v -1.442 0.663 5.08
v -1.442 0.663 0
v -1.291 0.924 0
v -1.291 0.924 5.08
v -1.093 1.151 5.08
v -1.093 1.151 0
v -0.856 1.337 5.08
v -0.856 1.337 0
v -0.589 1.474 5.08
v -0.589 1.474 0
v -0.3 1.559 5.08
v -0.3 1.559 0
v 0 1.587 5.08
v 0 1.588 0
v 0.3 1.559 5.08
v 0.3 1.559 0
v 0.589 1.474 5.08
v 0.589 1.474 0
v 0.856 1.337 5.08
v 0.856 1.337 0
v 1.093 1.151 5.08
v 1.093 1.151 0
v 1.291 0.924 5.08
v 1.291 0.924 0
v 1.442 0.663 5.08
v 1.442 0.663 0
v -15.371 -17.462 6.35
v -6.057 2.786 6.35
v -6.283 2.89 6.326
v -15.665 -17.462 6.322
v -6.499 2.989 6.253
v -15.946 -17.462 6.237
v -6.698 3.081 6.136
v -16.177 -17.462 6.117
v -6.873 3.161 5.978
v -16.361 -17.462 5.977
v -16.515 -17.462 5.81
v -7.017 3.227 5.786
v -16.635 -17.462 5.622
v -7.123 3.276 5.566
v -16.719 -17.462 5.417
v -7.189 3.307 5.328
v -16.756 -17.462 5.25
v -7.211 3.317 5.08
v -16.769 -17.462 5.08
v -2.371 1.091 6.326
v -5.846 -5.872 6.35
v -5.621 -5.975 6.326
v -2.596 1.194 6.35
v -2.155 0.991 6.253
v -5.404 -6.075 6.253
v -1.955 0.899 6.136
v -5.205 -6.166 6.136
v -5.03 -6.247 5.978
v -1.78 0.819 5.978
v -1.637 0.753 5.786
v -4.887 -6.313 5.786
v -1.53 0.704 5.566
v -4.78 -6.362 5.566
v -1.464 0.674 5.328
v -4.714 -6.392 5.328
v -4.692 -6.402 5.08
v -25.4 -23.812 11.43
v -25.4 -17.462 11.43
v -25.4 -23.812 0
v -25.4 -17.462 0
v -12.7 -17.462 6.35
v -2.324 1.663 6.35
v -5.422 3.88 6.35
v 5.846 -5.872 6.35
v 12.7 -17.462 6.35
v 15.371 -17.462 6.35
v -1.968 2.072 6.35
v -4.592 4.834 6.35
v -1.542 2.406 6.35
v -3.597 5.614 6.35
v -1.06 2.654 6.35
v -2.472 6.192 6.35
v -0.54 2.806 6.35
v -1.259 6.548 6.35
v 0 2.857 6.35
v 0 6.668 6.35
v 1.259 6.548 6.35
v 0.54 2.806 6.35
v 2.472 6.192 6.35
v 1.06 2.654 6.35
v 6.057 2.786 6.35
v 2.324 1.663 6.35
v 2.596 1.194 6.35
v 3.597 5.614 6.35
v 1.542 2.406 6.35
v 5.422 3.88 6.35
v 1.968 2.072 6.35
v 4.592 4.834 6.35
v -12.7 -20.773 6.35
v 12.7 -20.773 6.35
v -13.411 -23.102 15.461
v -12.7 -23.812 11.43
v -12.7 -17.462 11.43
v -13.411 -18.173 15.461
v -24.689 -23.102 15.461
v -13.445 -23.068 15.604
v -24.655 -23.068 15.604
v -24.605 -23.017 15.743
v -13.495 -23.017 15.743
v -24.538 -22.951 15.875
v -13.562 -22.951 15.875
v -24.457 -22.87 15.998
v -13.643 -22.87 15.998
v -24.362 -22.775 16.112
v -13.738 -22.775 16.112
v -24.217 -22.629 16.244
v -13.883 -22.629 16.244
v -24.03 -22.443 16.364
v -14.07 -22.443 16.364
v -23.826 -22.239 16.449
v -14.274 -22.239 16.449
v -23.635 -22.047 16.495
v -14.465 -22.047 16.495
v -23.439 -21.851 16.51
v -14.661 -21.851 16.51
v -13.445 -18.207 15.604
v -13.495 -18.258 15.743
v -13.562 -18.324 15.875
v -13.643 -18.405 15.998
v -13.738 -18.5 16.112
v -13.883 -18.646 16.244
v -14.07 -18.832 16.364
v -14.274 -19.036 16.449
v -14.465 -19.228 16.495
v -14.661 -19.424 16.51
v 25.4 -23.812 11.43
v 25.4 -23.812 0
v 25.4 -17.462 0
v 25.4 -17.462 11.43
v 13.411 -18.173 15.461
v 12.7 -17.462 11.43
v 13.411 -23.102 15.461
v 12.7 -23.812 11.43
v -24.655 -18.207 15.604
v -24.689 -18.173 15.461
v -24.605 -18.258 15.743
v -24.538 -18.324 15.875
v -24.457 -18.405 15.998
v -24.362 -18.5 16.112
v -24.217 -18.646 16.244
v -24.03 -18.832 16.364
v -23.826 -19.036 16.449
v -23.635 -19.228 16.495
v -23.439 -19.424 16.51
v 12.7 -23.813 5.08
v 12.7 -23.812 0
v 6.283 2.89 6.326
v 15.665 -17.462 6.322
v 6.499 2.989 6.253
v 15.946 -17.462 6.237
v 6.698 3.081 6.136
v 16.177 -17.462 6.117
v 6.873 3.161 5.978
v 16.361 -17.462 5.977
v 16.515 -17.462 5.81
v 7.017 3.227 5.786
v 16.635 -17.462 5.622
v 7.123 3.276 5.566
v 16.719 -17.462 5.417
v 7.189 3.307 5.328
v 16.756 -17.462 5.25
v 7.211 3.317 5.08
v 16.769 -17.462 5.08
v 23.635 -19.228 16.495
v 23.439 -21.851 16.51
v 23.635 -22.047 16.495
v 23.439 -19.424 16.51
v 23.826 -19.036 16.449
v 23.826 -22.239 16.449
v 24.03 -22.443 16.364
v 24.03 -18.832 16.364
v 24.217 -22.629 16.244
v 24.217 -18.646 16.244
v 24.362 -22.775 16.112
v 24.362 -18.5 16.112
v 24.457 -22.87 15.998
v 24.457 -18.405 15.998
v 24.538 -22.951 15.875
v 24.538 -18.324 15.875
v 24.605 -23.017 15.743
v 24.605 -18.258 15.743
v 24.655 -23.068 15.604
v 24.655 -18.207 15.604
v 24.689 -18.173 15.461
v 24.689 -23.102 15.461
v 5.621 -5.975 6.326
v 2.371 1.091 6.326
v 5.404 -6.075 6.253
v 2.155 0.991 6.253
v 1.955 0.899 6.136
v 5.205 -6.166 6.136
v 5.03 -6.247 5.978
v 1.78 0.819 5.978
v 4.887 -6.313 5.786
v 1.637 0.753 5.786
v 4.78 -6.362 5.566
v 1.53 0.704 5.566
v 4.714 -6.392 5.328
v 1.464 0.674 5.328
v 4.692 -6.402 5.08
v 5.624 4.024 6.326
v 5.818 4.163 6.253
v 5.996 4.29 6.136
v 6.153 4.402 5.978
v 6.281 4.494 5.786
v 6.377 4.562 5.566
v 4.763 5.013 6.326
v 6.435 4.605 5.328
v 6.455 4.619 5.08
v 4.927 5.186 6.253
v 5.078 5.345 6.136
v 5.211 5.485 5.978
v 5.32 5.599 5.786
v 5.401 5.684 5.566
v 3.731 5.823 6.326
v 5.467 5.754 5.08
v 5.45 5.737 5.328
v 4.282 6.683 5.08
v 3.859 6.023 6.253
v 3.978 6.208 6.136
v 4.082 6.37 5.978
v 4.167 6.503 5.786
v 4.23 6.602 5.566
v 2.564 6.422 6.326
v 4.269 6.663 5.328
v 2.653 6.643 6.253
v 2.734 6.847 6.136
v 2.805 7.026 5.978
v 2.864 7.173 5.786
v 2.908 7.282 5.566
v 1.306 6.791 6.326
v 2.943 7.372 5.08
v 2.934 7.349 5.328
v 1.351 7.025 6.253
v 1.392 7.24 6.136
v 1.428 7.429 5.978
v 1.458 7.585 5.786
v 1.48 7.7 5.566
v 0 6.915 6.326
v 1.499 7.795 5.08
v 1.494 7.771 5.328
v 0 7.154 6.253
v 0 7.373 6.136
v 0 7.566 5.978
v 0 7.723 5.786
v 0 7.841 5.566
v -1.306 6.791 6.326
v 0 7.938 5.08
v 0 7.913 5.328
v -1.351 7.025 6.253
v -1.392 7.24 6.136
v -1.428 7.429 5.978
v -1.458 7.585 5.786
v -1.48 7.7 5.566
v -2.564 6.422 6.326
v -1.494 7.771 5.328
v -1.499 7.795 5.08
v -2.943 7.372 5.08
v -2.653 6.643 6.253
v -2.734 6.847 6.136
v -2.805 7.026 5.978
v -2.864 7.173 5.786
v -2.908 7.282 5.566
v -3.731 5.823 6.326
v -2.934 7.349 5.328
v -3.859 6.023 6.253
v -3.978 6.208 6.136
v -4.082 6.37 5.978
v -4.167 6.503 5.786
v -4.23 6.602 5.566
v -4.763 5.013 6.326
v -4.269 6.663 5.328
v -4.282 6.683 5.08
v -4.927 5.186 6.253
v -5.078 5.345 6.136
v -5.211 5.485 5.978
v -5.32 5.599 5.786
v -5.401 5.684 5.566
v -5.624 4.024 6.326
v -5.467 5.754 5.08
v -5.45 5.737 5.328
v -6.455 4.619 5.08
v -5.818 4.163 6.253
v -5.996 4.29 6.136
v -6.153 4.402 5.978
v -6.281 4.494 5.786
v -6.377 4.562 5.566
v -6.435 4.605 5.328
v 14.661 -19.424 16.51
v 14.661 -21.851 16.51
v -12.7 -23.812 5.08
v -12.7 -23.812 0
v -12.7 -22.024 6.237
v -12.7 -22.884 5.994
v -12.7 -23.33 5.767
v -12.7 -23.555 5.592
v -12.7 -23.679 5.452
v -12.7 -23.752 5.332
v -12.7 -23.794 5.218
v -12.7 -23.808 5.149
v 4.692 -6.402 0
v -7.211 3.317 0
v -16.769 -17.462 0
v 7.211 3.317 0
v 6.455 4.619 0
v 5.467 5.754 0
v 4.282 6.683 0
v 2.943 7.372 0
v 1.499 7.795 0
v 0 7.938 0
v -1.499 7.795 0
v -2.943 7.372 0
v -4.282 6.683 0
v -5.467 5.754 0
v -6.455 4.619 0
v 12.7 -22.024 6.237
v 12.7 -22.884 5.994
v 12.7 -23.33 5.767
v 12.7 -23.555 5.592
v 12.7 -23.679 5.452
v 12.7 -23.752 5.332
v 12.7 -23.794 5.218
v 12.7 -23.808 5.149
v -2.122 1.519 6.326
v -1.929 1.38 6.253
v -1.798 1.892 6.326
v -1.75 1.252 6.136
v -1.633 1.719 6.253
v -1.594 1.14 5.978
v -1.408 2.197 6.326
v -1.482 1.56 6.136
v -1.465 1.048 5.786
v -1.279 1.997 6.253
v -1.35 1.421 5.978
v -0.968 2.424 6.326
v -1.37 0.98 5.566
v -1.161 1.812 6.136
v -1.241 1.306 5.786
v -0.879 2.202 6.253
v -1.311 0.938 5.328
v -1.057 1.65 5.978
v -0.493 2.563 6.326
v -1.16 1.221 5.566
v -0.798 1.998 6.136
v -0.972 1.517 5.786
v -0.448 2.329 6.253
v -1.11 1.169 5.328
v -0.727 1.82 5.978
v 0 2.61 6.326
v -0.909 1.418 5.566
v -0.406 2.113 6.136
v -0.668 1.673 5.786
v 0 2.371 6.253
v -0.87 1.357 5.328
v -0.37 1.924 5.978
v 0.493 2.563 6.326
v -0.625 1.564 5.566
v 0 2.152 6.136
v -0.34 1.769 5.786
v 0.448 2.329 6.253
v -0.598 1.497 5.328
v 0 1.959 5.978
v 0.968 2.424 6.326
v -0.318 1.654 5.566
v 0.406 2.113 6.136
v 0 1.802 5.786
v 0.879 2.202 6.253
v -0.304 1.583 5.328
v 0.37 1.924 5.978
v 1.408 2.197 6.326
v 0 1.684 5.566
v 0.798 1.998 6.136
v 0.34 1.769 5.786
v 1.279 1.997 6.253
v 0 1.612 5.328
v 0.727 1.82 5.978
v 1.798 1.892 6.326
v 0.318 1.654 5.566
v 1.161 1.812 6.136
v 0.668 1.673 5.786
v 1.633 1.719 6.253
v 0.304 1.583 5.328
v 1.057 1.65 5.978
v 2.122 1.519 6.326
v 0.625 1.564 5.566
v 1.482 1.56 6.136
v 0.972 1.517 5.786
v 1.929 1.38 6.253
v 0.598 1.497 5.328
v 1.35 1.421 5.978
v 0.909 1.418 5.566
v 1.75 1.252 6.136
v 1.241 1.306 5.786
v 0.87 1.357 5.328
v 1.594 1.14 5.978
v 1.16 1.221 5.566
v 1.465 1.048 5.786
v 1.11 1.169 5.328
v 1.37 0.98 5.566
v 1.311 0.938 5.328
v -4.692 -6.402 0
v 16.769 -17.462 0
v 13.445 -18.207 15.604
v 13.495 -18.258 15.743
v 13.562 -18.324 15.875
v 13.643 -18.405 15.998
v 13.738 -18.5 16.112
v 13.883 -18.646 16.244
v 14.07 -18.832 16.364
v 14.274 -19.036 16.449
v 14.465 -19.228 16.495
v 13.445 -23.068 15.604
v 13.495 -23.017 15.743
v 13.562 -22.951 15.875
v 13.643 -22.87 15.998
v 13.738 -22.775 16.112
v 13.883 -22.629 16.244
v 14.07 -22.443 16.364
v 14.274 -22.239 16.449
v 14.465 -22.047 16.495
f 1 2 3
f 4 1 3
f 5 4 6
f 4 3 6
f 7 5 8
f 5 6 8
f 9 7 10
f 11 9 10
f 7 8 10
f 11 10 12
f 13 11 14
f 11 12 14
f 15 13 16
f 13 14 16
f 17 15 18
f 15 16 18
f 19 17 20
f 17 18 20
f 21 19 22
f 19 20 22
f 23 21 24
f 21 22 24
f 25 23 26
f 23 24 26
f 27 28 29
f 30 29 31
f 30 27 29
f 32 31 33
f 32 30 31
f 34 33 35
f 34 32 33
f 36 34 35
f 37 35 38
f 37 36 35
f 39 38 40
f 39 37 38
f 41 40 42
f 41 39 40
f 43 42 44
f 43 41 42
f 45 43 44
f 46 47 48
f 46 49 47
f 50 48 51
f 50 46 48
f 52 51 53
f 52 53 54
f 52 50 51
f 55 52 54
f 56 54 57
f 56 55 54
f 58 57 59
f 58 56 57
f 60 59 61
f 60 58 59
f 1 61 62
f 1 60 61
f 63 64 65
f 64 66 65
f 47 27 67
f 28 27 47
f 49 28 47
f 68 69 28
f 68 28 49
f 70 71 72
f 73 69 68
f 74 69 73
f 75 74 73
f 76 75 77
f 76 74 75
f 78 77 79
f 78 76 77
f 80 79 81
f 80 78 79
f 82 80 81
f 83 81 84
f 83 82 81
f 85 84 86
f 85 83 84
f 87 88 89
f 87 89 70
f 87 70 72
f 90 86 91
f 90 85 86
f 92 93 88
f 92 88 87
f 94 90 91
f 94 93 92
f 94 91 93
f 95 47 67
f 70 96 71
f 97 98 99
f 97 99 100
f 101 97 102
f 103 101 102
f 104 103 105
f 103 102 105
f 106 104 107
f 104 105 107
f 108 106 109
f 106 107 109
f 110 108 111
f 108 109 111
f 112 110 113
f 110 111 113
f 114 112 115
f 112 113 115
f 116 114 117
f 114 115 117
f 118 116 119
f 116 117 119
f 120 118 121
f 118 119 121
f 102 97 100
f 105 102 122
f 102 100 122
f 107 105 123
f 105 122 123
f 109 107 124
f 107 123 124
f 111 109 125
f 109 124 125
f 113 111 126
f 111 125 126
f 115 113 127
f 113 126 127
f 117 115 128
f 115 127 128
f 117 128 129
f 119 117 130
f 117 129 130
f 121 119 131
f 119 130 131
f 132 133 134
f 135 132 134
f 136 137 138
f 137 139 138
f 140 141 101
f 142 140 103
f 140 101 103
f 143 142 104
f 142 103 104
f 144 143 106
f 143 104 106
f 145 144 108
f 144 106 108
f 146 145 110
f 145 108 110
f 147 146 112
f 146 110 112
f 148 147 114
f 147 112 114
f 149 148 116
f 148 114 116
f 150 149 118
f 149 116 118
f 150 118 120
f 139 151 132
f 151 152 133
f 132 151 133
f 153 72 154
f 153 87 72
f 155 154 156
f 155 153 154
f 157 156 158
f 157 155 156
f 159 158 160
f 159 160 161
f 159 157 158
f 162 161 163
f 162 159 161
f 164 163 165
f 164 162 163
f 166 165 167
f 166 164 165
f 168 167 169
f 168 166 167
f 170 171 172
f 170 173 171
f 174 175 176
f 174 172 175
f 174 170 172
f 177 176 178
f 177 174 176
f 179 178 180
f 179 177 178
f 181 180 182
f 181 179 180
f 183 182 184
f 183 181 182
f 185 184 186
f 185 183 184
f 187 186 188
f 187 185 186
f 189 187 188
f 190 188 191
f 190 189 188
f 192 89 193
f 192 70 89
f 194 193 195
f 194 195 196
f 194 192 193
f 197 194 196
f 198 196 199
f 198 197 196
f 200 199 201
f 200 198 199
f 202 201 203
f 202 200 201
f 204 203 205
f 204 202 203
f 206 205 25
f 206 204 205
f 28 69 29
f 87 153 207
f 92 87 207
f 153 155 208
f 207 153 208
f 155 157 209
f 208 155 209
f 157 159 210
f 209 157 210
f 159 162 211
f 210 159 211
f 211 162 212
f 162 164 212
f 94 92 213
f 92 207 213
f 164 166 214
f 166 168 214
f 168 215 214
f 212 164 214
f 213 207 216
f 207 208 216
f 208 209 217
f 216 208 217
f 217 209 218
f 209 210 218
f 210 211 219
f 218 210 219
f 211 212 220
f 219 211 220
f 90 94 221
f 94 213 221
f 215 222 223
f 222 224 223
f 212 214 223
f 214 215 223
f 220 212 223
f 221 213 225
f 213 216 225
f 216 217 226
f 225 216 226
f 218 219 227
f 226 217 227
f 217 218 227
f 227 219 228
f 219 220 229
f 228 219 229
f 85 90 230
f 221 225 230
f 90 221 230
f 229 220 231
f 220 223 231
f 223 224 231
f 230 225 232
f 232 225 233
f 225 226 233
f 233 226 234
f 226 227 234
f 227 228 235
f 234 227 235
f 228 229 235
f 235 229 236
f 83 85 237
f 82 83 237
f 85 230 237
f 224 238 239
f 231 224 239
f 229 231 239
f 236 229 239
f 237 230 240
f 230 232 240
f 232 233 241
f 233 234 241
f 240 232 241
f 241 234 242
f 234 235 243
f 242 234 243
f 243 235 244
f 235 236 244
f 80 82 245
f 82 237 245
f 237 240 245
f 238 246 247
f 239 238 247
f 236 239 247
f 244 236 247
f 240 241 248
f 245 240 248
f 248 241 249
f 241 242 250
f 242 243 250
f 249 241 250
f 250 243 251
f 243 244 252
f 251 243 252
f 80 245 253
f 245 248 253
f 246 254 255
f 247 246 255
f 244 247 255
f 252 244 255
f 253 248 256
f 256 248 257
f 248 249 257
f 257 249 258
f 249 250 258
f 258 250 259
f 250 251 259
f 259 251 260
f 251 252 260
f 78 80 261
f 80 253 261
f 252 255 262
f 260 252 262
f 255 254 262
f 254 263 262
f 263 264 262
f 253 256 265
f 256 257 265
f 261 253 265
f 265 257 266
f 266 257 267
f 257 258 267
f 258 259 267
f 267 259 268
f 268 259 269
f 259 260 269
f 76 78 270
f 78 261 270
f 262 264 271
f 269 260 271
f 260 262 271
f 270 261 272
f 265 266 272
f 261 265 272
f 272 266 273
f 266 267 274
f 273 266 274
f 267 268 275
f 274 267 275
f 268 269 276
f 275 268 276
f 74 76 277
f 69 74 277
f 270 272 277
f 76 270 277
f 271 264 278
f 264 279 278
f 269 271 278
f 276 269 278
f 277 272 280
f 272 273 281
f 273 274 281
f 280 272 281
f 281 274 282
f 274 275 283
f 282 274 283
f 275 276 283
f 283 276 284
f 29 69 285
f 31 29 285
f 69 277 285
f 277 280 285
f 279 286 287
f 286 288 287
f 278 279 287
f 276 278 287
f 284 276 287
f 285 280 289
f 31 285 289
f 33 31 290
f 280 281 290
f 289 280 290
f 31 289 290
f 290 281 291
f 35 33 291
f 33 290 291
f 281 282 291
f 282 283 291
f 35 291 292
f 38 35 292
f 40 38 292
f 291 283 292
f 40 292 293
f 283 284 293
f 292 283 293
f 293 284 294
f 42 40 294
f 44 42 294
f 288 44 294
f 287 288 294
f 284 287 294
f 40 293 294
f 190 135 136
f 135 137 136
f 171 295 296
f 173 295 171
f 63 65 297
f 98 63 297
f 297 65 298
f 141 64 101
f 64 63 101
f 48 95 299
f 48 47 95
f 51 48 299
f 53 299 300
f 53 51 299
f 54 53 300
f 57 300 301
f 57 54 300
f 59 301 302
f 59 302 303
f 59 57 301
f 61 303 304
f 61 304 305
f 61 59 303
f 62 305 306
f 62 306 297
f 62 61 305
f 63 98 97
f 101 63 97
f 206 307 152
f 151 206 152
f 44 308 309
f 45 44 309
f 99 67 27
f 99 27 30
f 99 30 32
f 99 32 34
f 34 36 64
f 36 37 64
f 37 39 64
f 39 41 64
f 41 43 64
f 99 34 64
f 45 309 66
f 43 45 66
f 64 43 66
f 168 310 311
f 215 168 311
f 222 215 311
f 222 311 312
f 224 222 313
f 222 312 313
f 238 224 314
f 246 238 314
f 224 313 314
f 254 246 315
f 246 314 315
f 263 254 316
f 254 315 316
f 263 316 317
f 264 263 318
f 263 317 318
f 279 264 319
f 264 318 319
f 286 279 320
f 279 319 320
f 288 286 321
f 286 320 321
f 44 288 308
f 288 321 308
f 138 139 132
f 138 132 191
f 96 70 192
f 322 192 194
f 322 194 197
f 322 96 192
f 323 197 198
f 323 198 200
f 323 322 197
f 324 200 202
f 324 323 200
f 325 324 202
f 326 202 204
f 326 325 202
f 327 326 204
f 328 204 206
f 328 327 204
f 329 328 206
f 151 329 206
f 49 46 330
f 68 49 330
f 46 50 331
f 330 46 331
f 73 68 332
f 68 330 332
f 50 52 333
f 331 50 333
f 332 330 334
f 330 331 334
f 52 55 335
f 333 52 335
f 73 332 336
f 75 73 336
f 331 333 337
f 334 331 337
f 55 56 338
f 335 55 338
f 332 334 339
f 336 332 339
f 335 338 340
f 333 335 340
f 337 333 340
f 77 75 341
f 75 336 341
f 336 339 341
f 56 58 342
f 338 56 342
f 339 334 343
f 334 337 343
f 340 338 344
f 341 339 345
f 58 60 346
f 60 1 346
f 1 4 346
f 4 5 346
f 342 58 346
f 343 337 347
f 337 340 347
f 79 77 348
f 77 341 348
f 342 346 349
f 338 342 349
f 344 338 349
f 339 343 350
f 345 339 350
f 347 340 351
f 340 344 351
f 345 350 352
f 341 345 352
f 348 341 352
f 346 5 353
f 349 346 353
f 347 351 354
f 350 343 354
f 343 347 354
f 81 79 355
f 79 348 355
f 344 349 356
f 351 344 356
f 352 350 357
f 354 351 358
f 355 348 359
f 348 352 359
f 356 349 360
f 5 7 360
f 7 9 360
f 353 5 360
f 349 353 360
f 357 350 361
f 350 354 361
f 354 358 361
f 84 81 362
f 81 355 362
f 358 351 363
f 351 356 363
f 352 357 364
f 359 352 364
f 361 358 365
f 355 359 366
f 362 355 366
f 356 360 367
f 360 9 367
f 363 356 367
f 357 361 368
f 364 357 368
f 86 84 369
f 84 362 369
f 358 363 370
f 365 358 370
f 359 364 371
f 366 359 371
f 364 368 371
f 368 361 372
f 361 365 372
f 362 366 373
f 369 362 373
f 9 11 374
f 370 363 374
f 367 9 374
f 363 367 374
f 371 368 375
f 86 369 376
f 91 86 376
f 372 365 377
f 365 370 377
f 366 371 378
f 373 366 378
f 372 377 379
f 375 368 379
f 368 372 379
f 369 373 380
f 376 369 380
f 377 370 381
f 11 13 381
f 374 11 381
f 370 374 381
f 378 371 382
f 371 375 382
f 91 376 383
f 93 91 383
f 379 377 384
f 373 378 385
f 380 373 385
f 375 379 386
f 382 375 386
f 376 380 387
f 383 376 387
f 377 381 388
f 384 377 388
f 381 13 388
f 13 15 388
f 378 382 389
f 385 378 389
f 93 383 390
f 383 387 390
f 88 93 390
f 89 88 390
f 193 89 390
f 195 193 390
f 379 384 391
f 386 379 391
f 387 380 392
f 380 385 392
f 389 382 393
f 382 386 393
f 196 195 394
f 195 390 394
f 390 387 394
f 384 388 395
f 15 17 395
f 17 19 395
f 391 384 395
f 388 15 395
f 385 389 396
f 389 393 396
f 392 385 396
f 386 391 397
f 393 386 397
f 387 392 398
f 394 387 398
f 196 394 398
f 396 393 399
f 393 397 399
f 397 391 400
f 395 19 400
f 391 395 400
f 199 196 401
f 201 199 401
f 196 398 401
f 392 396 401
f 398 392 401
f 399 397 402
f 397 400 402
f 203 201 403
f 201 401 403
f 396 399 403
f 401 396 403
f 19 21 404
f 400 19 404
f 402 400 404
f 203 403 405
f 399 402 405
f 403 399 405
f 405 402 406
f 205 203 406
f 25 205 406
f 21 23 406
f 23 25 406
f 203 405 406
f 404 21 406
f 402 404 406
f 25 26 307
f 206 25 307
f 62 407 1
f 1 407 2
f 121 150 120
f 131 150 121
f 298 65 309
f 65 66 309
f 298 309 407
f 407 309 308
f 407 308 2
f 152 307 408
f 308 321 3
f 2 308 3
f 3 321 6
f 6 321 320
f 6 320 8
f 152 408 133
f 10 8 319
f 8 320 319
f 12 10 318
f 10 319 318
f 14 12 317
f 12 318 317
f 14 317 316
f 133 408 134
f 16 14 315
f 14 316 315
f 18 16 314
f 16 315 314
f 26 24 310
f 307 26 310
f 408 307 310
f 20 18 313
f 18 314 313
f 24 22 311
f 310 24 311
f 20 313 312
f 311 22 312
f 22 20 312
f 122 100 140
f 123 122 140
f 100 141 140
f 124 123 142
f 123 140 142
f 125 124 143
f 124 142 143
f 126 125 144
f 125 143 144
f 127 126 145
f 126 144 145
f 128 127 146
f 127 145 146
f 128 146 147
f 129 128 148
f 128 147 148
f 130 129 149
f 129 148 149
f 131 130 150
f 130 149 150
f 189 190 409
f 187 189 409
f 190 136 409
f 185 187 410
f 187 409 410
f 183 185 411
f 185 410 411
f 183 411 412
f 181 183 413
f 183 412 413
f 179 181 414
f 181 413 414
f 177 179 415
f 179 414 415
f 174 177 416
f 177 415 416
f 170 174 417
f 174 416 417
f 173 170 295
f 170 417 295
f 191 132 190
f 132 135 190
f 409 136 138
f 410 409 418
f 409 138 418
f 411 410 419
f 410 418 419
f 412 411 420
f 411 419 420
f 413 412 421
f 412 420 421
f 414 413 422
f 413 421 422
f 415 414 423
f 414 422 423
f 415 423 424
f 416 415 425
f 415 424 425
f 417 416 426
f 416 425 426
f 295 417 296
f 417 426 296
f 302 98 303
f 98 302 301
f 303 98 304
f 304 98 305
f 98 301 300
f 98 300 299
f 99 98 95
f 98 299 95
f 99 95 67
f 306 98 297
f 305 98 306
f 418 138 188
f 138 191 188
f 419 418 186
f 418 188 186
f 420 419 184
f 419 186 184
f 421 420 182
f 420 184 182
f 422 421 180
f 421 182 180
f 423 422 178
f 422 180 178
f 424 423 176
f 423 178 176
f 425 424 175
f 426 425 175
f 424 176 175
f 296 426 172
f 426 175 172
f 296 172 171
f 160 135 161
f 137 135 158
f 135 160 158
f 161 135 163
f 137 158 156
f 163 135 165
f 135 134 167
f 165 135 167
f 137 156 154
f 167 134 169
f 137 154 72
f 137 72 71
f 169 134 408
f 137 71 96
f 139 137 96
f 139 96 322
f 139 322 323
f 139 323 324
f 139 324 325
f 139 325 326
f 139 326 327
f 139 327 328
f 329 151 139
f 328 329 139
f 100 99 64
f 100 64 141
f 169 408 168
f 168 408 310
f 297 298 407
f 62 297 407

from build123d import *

# Parameters (mm, degrees)
F2_DEPTH  = 6.35
F5_DEPTH  = 5.08
F5_FACE_W = 12.7
F5_FACE_H = 6.35
F6_DEPTH  = 5.08
F6_TAPER  = 10
F7_R      = 1.27


# Not quite as in the source:
# - a variable given as a bare number and used for a length is read in inches; the dataset says mm whatever the document's units were


with BuildPart() as f2:
    # F1 (on Top) → F2 (new body)
    with BuildSketch(Plane.XY):
        Polygon((-25.4, -23.8125), (-12.7, -23.8125), (-12.7, -17.4625), (-16.7687909609, -17.4625), (-25.4, -17.4625), align=None)
        with BuildLine():
            Line((-12.7, -23.8125), (-4.6920856358, -6.4022057634))
            ThreePointArc((-4.6920856358, -6.4022057634), (-7.6835843575, -1.991591743), (-7.2112720666, 3.3168451022))
            Line((-7.2112720666, 3.3168451022), (-16.7687909609, -17.4625))
            Line((-16.7687909609, -17.4625), (-12.7, -17.4625))
            Line((-12.7, -17.4625), (-12.7, -23.8125))
        make_face()
        with BuildLine():
            ThreePointArc((-1.4422544133, 0.6633690204), (0, 1.5875), (1.4422544133, 0.6633690204))
            Line((1.4422544133, 0.6633690204), (4.6920856358, -6.4022057634))
            ThreePointArc((4.6920856358, -6.4022057634), (7.079807059, -3.5889048828), (7.9375, 0))
            ThreePointArc((7.9375, 0), (7.7538177138, 1.6977093717), (7.2112720666, 3.3168451022))
            ThreePointArc((7.2112720666, 3.3168451022), (0, 7.9375), (-7.2112720666, 3.3168451022))
            ThreePointArc((-7.2112720666, 3.3168451022), (-7.6835843575, -1.991591743), (-4.6920856358, -6.4022057634))
            Line((-4.6920856358, -6.4022057634), (-1.4422544133, 0.6633690204))
        make_face()
        with BuildLine():
            ThreePointArc((7.9375, 0), (7.079807059, -3.5889048828), (4.6920856358, -6.4022057634))
            Line((4.6920856358, -6.4022057634), (12.7, -23.8125))
            Line((12.7, -23.8125), (12.7, -17.4625))
            Line((12.7, -17.4625), (16.7687909609, -17.4625))
            Line((16.7687909609, -17.4625), (7.2112720666, 3.3168451022))
            ThreePointArc((7.2112720666, 3.3168451022), (7.7538177138, 1.6977093717), (7.9375, 0))
        make_face()
        Polygon((12.7, -17.4625), (12.7, -23.8125), (25.4, -23.8125), (25.4, -17.4625), (16.7687909609, -17.4625), align=None)
    extrude(amount=F2_DEPTH)

    # F4 (on face) → F5 (join)
    with BuildSketch(Plane.XY.offset(6.35)):
        Polygon((-12.7, -23.8125), (-12.7, -17.4625), (-16.7687909609, -17.4625), (-25.4, -17.4625), (-25.4, -23.8125), align=None)
        Polygon((25.4, -17.4625), (16.7687909609, -17.4625), (12.7, -17.4625), (12.7, -23.8125), (25.4, -23.8125), align=None)
    extrude(amount=F5_DEPTH)

    # F5_face (on face) → F6 (join)
    with BuildSketch(Plane(origin=(19.05, -20.6375, 11.43), x_dir=(1, 0, 0), z_dir=(0, 0, 1))):
        Rectangle(F5_FACE_W, F5_FACE_H)
        with Locations((-38.1, 0)):
            Rectangle(F5_FACE_W, F5_FACE_H)
    extrude(amount=F6_DEPTH, taper=F6_TAPER)

    # F7
    f7_edges = [f2.edges().sort_by_distance(p)[0] for p in [
        (19.05, -18.358241, 16.51),
        (13.595741, -20.6375, 16.51),
        (19.05, -22.916759, 16.51),
        (24.504259, -20.6375, 16.51),
        (-19.05, -18.358241, 16.51),
        (-13.595741, -20.6375, 16.51),
        (-19.05, -22.916759, 16.51),
        (-24.504259, -20.6375, 16.51),
        (7.071127, -11.574565, 6.35),
        (-11.990032, -7.072827, 6.35),
    ]]
    fillet(f7_edges, radius=F7_R)


solid = f2.part
